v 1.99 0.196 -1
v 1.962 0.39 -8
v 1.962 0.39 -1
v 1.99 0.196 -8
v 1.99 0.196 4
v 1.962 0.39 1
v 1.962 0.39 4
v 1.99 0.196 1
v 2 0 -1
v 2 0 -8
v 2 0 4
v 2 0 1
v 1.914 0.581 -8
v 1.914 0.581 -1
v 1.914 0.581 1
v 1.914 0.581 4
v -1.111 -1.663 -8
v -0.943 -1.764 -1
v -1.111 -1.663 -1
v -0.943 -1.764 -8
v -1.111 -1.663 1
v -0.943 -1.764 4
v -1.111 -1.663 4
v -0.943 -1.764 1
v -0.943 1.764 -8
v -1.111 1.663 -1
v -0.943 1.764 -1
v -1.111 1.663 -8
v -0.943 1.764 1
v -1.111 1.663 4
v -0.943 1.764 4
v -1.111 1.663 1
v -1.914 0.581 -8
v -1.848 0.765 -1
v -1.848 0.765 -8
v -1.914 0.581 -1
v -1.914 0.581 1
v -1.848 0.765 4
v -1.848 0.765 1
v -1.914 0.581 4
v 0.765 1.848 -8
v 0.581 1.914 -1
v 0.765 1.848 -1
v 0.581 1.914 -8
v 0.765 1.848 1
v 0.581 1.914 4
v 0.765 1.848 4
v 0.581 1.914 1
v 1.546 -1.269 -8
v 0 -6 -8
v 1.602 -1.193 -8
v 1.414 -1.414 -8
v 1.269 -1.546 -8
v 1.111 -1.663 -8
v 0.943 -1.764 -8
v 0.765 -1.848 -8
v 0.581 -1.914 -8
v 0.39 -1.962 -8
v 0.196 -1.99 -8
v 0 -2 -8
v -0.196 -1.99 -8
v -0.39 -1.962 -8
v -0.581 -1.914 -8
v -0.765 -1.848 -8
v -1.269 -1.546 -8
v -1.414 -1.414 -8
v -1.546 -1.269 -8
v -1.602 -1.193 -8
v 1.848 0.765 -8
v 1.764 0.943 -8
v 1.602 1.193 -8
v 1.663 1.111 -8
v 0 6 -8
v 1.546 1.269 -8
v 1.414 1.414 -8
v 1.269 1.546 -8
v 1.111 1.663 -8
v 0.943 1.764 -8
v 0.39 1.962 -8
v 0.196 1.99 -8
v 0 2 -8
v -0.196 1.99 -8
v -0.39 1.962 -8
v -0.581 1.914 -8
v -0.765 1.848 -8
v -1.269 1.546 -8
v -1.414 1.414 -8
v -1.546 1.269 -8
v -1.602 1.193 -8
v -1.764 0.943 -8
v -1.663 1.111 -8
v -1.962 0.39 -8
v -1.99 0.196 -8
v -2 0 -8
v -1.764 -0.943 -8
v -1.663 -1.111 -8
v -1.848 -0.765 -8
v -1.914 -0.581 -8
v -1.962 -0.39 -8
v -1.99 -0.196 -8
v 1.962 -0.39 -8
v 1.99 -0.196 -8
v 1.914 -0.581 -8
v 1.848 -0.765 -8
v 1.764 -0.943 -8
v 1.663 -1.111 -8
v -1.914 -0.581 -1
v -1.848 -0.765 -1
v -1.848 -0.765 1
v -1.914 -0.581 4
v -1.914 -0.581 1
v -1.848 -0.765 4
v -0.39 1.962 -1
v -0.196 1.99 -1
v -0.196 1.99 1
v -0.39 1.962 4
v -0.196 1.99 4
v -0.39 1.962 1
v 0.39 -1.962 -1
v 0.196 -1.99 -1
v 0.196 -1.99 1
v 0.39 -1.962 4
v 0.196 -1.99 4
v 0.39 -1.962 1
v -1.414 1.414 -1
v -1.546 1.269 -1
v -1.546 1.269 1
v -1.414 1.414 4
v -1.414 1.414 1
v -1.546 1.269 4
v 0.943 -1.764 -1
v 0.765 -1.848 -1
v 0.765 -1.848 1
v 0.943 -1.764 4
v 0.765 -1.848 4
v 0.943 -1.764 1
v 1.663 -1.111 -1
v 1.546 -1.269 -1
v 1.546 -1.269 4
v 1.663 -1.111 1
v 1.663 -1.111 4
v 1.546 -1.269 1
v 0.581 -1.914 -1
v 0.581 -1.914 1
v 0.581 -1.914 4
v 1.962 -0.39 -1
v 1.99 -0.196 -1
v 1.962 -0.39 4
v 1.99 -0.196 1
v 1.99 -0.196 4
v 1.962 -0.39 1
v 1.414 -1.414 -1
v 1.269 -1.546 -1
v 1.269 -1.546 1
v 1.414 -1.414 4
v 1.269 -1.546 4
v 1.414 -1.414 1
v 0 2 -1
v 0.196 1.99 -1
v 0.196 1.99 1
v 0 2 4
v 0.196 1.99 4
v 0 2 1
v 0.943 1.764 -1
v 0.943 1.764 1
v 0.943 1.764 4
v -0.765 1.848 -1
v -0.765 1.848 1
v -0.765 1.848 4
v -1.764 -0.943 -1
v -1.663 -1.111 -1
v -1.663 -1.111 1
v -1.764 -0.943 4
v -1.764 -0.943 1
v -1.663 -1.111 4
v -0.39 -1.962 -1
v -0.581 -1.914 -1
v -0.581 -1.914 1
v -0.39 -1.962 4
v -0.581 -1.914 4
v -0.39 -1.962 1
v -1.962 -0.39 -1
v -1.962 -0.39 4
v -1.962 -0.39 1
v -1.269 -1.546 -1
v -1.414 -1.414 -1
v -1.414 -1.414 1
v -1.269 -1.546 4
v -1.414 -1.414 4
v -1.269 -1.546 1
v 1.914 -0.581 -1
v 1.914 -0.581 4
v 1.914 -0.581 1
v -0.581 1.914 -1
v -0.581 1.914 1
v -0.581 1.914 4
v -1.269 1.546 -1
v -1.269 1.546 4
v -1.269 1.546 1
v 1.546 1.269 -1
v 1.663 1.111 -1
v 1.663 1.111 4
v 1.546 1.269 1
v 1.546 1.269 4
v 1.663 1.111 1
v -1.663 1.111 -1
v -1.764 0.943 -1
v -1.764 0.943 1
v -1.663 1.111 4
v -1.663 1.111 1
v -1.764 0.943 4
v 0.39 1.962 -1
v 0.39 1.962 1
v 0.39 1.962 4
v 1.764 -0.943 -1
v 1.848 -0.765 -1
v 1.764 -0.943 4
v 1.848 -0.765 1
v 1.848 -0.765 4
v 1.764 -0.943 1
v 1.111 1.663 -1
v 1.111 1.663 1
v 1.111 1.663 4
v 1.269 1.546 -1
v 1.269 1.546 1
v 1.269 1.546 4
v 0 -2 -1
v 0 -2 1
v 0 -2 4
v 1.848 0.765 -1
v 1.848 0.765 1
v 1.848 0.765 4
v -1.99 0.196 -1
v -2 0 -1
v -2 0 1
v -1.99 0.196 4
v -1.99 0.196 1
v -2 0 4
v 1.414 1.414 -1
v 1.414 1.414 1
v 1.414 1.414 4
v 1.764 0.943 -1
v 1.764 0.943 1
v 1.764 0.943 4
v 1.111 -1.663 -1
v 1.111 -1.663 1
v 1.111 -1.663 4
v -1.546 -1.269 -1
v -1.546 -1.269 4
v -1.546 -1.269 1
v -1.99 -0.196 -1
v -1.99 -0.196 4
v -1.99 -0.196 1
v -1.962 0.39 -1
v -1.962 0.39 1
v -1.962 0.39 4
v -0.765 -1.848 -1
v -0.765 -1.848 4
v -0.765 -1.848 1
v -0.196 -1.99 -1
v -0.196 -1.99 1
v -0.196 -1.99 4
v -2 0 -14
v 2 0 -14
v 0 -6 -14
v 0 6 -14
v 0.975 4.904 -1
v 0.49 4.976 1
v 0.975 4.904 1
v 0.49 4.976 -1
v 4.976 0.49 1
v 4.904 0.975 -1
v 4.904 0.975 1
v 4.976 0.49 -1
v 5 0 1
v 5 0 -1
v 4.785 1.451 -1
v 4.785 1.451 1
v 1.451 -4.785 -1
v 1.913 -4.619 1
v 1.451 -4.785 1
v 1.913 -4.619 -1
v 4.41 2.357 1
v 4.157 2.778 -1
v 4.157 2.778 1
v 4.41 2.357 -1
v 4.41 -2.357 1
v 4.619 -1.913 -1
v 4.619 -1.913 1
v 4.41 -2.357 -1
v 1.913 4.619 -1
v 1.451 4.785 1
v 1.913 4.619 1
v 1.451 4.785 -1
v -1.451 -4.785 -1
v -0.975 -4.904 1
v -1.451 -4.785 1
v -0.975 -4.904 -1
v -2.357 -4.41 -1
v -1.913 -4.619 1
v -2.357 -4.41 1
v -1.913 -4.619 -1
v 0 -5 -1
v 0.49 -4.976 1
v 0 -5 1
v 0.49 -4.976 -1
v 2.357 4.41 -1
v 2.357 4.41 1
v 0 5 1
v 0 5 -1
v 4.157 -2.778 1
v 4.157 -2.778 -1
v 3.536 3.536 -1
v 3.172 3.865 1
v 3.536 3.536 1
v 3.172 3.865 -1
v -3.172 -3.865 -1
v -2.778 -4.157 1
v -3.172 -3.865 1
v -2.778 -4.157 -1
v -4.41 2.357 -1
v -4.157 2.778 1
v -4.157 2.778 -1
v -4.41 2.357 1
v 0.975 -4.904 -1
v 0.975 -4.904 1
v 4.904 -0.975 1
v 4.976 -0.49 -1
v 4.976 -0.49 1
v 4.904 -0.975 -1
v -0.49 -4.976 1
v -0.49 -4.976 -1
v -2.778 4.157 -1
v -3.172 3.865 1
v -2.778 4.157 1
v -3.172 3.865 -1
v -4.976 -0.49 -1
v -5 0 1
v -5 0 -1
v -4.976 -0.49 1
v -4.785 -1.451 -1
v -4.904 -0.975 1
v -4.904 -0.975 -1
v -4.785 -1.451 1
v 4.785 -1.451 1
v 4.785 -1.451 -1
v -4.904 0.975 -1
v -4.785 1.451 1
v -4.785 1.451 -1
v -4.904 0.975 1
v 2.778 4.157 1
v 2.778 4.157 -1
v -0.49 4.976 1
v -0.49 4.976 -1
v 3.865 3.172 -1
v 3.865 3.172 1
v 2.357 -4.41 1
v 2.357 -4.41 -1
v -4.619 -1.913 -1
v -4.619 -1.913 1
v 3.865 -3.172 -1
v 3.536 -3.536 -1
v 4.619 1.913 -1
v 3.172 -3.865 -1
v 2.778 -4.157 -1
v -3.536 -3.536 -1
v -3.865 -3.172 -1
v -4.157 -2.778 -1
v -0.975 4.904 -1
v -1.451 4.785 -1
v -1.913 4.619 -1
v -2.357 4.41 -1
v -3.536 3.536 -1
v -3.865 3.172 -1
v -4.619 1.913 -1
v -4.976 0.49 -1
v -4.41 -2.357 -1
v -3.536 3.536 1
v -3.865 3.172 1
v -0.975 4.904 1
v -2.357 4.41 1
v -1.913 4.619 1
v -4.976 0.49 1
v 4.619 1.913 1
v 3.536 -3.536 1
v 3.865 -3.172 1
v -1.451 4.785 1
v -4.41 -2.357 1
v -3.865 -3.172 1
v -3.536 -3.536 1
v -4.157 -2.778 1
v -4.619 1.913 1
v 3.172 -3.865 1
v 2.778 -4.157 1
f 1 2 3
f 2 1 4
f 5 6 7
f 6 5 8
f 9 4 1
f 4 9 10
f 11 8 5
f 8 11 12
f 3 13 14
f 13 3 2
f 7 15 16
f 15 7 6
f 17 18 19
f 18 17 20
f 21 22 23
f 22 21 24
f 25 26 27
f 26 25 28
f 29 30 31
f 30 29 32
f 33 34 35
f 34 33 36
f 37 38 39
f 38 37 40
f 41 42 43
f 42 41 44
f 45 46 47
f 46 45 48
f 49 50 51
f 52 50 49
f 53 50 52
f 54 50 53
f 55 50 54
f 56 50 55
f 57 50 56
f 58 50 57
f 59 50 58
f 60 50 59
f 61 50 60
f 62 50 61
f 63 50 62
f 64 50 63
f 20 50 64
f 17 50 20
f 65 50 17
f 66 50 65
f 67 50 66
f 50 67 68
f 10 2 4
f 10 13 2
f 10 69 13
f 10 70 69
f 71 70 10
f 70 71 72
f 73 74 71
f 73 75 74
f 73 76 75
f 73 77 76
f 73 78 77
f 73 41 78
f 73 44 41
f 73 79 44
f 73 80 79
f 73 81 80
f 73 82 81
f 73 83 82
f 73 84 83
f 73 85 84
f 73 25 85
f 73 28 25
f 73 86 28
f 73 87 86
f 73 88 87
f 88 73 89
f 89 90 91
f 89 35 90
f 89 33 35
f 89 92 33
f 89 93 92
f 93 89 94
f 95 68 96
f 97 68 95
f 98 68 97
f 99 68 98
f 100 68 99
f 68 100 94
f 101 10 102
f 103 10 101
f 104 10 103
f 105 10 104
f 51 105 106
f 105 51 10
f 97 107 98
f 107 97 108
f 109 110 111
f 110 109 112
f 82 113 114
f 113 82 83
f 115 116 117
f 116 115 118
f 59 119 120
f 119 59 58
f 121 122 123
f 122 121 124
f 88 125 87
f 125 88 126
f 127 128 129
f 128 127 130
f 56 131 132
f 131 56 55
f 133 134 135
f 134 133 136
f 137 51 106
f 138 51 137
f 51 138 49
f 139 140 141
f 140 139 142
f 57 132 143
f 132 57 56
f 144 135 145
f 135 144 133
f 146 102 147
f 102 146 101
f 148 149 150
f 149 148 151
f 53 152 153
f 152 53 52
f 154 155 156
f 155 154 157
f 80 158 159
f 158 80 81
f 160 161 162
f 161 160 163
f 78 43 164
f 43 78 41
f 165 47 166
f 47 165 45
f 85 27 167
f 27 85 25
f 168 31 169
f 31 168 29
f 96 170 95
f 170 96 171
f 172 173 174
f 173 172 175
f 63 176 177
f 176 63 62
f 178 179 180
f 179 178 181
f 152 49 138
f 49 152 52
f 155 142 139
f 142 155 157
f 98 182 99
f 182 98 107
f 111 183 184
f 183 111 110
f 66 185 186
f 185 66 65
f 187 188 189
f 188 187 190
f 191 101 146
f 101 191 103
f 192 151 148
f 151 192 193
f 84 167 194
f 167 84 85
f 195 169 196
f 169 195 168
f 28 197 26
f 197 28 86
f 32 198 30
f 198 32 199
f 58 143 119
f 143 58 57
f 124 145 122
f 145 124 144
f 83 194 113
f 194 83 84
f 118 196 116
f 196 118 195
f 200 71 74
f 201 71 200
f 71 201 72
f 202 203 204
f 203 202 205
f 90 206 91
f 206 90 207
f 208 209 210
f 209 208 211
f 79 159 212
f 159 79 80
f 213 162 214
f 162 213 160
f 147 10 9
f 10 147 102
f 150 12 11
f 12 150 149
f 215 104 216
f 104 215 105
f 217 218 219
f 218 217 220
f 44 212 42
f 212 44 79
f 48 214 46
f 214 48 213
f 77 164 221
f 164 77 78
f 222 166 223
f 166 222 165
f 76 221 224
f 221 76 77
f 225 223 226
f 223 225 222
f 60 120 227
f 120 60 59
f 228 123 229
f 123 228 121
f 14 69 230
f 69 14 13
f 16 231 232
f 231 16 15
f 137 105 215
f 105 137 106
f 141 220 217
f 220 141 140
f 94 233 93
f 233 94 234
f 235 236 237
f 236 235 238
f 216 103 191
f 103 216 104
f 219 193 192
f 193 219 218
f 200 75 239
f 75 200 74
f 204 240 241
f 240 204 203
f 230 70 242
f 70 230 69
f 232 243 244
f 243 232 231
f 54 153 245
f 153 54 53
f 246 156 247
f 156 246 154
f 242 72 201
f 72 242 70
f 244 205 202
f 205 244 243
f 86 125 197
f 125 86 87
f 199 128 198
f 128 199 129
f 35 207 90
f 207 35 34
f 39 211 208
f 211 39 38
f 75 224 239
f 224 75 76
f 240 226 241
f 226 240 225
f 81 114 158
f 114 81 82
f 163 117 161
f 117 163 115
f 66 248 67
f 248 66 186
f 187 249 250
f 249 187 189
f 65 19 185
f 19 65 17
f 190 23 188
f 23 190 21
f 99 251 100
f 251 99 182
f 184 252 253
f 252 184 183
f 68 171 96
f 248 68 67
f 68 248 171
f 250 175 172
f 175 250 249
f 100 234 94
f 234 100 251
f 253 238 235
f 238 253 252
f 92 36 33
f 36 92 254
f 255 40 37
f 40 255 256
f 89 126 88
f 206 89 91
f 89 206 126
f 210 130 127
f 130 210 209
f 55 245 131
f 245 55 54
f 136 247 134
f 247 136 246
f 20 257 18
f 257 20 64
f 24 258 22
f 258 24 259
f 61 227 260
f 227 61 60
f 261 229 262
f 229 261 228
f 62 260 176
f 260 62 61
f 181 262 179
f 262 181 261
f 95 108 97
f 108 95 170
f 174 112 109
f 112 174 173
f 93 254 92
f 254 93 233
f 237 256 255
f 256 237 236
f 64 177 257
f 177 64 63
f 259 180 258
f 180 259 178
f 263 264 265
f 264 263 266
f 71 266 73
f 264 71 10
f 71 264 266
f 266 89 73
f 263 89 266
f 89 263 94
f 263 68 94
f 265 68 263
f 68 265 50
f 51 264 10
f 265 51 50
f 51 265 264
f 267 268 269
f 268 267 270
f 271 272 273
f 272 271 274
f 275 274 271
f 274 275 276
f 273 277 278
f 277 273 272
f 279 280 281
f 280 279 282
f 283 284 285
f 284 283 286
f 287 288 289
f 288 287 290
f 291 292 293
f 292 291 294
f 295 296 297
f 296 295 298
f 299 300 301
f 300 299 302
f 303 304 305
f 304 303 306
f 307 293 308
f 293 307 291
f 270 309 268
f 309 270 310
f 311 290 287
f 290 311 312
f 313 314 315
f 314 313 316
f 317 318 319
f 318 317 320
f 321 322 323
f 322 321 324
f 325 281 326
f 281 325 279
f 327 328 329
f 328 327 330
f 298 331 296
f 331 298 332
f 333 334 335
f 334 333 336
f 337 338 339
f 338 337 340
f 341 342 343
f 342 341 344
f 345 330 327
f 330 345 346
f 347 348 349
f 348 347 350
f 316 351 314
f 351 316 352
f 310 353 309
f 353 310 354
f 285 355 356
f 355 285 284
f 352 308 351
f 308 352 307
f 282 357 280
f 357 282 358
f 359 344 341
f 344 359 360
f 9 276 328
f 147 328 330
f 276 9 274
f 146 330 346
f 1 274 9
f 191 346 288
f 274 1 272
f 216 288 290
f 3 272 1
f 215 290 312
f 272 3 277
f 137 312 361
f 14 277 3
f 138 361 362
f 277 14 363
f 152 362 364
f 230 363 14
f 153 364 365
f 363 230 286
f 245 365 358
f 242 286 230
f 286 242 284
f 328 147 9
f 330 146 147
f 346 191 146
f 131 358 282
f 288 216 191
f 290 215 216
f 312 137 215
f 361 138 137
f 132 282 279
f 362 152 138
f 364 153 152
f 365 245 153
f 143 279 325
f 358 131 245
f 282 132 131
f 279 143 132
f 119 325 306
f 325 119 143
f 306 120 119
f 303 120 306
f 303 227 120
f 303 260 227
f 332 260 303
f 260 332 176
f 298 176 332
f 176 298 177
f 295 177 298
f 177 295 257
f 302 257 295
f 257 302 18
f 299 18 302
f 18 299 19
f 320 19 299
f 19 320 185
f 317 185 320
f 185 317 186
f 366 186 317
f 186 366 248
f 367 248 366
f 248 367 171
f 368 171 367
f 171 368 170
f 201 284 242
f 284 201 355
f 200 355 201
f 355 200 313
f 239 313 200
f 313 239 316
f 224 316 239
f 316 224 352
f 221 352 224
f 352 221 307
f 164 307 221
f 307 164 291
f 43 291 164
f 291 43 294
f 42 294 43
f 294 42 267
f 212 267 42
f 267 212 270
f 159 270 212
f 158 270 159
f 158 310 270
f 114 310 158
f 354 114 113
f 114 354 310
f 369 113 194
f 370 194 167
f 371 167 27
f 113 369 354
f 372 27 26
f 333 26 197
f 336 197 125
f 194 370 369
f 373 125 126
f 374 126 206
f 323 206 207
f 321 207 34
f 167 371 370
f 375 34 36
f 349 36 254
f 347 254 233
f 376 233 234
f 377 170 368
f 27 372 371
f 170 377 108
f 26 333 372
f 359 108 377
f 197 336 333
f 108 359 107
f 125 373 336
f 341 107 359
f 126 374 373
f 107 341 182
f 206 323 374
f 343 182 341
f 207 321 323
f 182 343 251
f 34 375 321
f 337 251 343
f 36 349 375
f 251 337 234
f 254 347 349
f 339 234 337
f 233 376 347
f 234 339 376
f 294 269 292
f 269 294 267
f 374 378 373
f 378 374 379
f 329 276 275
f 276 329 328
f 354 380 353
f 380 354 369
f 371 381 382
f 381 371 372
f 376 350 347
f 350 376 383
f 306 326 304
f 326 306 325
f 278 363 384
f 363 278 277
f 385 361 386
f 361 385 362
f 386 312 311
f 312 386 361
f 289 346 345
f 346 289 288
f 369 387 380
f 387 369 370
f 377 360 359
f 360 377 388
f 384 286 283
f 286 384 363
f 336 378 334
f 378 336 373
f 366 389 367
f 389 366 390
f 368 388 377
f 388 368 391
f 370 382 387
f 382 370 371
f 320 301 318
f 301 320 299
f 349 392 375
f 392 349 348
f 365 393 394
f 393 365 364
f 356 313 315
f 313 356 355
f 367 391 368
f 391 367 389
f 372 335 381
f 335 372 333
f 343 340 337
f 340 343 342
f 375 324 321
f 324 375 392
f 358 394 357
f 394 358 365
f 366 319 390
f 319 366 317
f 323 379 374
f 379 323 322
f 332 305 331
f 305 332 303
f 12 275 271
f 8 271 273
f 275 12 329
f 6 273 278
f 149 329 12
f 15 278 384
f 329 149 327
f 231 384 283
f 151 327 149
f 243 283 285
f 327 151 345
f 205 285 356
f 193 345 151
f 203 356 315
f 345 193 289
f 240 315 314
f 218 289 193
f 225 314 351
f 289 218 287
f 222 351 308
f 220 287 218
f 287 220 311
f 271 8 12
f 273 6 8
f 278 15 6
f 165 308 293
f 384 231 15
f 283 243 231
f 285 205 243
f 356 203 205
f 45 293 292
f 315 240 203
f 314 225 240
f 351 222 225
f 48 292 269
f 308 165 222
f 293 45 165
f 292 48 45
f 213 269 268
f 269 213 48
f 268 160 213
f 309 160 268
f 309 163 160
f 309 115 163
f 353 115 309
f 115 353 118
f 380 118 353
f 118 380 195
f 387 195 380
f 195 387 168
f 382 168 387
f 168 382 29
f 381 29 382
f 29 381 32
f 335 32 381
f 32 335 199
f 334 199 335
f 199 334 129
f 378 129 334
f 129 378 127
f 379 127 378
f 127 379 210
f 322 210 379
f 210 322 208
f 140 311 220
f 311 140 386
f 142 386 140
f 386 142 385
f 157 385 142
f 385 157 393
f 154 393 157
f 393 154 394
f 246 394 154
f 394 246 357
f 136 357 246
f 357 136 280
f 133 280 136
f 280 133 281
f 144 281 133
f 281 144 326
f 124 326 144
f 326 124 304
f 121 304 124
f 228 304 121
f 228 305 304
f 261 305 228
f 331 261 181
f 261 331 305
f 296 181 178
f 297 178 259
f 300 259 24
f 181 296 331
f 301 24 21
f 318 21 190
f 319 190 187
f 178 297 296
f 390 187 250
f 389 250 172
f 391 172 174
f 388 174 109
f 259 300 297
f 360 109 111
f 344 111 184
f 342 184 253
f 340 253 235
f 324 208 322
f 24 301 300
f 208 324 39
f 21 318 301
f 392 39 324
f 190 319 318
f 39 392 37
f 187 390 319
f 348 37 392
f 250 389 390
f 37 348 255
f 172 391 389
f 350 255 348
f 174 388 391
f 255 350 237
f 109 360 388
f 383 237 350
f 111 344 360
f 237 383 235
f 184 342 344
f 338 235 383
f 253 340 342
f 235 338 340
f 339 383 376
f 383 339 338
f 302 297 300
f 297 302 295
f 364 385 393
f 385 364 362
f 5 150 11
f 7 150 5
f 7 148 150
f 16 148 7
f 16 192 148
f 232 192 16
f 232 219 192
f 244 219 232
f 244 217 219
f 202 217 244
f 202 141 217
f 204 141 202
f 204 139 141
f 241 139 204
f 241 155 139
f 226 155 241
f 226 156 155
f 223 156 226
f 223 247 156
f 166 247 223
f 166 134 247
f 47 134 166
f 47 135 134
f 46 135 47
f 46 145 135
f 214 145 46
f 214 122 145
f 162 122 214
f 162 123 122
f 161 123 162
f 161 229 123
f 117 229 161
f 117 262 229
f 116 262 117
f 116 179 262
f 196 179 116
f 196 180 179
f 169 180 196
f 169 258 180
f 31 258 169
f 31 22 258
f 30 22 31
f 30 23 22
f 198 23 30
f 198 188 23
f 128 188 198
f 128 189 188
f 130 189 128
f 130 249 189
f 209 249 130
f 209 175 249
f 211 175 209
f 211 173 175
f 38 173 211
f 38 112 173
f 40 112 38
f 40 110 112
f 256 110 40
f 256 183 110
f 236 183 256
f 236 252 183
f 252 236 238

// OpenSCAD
module fastener() {
    $fn = 64;
    
    // Flange
    cylinder(h = 2.0, d = 10.0, center = true);
    
    // Shank
    translate([0, 0, -8.0])
        cylinder(h = 12.0, d = 4.0, center = false);
    
    // Prongs
    translate([0, 0, -8.0])
    difference() {
        cylinder(h = 6.0, d = 4.0, center = false);
        translate([0, 0, -1.0])
            cylinder(h = 7.0, d = 3.0, center = false);
    }
    
    // Tapered prongs
    translate([0, 0, -14.0])
    union() {
        rotate([0, 0, 0])
            translate([-2.0, 0, 0])
                linear_extrude(height = 6.0)
                    polygon(points = [[0, 0], [4, 0], [2, 6]]);
        rotate([0, 0, 180])
            translate([-2.0, 0, 0])
                linear_extrude(height = 6.0)
                    polygon(points = [[0, 0], [4, 0], [2, 6]]);
    }
}

fastener();
